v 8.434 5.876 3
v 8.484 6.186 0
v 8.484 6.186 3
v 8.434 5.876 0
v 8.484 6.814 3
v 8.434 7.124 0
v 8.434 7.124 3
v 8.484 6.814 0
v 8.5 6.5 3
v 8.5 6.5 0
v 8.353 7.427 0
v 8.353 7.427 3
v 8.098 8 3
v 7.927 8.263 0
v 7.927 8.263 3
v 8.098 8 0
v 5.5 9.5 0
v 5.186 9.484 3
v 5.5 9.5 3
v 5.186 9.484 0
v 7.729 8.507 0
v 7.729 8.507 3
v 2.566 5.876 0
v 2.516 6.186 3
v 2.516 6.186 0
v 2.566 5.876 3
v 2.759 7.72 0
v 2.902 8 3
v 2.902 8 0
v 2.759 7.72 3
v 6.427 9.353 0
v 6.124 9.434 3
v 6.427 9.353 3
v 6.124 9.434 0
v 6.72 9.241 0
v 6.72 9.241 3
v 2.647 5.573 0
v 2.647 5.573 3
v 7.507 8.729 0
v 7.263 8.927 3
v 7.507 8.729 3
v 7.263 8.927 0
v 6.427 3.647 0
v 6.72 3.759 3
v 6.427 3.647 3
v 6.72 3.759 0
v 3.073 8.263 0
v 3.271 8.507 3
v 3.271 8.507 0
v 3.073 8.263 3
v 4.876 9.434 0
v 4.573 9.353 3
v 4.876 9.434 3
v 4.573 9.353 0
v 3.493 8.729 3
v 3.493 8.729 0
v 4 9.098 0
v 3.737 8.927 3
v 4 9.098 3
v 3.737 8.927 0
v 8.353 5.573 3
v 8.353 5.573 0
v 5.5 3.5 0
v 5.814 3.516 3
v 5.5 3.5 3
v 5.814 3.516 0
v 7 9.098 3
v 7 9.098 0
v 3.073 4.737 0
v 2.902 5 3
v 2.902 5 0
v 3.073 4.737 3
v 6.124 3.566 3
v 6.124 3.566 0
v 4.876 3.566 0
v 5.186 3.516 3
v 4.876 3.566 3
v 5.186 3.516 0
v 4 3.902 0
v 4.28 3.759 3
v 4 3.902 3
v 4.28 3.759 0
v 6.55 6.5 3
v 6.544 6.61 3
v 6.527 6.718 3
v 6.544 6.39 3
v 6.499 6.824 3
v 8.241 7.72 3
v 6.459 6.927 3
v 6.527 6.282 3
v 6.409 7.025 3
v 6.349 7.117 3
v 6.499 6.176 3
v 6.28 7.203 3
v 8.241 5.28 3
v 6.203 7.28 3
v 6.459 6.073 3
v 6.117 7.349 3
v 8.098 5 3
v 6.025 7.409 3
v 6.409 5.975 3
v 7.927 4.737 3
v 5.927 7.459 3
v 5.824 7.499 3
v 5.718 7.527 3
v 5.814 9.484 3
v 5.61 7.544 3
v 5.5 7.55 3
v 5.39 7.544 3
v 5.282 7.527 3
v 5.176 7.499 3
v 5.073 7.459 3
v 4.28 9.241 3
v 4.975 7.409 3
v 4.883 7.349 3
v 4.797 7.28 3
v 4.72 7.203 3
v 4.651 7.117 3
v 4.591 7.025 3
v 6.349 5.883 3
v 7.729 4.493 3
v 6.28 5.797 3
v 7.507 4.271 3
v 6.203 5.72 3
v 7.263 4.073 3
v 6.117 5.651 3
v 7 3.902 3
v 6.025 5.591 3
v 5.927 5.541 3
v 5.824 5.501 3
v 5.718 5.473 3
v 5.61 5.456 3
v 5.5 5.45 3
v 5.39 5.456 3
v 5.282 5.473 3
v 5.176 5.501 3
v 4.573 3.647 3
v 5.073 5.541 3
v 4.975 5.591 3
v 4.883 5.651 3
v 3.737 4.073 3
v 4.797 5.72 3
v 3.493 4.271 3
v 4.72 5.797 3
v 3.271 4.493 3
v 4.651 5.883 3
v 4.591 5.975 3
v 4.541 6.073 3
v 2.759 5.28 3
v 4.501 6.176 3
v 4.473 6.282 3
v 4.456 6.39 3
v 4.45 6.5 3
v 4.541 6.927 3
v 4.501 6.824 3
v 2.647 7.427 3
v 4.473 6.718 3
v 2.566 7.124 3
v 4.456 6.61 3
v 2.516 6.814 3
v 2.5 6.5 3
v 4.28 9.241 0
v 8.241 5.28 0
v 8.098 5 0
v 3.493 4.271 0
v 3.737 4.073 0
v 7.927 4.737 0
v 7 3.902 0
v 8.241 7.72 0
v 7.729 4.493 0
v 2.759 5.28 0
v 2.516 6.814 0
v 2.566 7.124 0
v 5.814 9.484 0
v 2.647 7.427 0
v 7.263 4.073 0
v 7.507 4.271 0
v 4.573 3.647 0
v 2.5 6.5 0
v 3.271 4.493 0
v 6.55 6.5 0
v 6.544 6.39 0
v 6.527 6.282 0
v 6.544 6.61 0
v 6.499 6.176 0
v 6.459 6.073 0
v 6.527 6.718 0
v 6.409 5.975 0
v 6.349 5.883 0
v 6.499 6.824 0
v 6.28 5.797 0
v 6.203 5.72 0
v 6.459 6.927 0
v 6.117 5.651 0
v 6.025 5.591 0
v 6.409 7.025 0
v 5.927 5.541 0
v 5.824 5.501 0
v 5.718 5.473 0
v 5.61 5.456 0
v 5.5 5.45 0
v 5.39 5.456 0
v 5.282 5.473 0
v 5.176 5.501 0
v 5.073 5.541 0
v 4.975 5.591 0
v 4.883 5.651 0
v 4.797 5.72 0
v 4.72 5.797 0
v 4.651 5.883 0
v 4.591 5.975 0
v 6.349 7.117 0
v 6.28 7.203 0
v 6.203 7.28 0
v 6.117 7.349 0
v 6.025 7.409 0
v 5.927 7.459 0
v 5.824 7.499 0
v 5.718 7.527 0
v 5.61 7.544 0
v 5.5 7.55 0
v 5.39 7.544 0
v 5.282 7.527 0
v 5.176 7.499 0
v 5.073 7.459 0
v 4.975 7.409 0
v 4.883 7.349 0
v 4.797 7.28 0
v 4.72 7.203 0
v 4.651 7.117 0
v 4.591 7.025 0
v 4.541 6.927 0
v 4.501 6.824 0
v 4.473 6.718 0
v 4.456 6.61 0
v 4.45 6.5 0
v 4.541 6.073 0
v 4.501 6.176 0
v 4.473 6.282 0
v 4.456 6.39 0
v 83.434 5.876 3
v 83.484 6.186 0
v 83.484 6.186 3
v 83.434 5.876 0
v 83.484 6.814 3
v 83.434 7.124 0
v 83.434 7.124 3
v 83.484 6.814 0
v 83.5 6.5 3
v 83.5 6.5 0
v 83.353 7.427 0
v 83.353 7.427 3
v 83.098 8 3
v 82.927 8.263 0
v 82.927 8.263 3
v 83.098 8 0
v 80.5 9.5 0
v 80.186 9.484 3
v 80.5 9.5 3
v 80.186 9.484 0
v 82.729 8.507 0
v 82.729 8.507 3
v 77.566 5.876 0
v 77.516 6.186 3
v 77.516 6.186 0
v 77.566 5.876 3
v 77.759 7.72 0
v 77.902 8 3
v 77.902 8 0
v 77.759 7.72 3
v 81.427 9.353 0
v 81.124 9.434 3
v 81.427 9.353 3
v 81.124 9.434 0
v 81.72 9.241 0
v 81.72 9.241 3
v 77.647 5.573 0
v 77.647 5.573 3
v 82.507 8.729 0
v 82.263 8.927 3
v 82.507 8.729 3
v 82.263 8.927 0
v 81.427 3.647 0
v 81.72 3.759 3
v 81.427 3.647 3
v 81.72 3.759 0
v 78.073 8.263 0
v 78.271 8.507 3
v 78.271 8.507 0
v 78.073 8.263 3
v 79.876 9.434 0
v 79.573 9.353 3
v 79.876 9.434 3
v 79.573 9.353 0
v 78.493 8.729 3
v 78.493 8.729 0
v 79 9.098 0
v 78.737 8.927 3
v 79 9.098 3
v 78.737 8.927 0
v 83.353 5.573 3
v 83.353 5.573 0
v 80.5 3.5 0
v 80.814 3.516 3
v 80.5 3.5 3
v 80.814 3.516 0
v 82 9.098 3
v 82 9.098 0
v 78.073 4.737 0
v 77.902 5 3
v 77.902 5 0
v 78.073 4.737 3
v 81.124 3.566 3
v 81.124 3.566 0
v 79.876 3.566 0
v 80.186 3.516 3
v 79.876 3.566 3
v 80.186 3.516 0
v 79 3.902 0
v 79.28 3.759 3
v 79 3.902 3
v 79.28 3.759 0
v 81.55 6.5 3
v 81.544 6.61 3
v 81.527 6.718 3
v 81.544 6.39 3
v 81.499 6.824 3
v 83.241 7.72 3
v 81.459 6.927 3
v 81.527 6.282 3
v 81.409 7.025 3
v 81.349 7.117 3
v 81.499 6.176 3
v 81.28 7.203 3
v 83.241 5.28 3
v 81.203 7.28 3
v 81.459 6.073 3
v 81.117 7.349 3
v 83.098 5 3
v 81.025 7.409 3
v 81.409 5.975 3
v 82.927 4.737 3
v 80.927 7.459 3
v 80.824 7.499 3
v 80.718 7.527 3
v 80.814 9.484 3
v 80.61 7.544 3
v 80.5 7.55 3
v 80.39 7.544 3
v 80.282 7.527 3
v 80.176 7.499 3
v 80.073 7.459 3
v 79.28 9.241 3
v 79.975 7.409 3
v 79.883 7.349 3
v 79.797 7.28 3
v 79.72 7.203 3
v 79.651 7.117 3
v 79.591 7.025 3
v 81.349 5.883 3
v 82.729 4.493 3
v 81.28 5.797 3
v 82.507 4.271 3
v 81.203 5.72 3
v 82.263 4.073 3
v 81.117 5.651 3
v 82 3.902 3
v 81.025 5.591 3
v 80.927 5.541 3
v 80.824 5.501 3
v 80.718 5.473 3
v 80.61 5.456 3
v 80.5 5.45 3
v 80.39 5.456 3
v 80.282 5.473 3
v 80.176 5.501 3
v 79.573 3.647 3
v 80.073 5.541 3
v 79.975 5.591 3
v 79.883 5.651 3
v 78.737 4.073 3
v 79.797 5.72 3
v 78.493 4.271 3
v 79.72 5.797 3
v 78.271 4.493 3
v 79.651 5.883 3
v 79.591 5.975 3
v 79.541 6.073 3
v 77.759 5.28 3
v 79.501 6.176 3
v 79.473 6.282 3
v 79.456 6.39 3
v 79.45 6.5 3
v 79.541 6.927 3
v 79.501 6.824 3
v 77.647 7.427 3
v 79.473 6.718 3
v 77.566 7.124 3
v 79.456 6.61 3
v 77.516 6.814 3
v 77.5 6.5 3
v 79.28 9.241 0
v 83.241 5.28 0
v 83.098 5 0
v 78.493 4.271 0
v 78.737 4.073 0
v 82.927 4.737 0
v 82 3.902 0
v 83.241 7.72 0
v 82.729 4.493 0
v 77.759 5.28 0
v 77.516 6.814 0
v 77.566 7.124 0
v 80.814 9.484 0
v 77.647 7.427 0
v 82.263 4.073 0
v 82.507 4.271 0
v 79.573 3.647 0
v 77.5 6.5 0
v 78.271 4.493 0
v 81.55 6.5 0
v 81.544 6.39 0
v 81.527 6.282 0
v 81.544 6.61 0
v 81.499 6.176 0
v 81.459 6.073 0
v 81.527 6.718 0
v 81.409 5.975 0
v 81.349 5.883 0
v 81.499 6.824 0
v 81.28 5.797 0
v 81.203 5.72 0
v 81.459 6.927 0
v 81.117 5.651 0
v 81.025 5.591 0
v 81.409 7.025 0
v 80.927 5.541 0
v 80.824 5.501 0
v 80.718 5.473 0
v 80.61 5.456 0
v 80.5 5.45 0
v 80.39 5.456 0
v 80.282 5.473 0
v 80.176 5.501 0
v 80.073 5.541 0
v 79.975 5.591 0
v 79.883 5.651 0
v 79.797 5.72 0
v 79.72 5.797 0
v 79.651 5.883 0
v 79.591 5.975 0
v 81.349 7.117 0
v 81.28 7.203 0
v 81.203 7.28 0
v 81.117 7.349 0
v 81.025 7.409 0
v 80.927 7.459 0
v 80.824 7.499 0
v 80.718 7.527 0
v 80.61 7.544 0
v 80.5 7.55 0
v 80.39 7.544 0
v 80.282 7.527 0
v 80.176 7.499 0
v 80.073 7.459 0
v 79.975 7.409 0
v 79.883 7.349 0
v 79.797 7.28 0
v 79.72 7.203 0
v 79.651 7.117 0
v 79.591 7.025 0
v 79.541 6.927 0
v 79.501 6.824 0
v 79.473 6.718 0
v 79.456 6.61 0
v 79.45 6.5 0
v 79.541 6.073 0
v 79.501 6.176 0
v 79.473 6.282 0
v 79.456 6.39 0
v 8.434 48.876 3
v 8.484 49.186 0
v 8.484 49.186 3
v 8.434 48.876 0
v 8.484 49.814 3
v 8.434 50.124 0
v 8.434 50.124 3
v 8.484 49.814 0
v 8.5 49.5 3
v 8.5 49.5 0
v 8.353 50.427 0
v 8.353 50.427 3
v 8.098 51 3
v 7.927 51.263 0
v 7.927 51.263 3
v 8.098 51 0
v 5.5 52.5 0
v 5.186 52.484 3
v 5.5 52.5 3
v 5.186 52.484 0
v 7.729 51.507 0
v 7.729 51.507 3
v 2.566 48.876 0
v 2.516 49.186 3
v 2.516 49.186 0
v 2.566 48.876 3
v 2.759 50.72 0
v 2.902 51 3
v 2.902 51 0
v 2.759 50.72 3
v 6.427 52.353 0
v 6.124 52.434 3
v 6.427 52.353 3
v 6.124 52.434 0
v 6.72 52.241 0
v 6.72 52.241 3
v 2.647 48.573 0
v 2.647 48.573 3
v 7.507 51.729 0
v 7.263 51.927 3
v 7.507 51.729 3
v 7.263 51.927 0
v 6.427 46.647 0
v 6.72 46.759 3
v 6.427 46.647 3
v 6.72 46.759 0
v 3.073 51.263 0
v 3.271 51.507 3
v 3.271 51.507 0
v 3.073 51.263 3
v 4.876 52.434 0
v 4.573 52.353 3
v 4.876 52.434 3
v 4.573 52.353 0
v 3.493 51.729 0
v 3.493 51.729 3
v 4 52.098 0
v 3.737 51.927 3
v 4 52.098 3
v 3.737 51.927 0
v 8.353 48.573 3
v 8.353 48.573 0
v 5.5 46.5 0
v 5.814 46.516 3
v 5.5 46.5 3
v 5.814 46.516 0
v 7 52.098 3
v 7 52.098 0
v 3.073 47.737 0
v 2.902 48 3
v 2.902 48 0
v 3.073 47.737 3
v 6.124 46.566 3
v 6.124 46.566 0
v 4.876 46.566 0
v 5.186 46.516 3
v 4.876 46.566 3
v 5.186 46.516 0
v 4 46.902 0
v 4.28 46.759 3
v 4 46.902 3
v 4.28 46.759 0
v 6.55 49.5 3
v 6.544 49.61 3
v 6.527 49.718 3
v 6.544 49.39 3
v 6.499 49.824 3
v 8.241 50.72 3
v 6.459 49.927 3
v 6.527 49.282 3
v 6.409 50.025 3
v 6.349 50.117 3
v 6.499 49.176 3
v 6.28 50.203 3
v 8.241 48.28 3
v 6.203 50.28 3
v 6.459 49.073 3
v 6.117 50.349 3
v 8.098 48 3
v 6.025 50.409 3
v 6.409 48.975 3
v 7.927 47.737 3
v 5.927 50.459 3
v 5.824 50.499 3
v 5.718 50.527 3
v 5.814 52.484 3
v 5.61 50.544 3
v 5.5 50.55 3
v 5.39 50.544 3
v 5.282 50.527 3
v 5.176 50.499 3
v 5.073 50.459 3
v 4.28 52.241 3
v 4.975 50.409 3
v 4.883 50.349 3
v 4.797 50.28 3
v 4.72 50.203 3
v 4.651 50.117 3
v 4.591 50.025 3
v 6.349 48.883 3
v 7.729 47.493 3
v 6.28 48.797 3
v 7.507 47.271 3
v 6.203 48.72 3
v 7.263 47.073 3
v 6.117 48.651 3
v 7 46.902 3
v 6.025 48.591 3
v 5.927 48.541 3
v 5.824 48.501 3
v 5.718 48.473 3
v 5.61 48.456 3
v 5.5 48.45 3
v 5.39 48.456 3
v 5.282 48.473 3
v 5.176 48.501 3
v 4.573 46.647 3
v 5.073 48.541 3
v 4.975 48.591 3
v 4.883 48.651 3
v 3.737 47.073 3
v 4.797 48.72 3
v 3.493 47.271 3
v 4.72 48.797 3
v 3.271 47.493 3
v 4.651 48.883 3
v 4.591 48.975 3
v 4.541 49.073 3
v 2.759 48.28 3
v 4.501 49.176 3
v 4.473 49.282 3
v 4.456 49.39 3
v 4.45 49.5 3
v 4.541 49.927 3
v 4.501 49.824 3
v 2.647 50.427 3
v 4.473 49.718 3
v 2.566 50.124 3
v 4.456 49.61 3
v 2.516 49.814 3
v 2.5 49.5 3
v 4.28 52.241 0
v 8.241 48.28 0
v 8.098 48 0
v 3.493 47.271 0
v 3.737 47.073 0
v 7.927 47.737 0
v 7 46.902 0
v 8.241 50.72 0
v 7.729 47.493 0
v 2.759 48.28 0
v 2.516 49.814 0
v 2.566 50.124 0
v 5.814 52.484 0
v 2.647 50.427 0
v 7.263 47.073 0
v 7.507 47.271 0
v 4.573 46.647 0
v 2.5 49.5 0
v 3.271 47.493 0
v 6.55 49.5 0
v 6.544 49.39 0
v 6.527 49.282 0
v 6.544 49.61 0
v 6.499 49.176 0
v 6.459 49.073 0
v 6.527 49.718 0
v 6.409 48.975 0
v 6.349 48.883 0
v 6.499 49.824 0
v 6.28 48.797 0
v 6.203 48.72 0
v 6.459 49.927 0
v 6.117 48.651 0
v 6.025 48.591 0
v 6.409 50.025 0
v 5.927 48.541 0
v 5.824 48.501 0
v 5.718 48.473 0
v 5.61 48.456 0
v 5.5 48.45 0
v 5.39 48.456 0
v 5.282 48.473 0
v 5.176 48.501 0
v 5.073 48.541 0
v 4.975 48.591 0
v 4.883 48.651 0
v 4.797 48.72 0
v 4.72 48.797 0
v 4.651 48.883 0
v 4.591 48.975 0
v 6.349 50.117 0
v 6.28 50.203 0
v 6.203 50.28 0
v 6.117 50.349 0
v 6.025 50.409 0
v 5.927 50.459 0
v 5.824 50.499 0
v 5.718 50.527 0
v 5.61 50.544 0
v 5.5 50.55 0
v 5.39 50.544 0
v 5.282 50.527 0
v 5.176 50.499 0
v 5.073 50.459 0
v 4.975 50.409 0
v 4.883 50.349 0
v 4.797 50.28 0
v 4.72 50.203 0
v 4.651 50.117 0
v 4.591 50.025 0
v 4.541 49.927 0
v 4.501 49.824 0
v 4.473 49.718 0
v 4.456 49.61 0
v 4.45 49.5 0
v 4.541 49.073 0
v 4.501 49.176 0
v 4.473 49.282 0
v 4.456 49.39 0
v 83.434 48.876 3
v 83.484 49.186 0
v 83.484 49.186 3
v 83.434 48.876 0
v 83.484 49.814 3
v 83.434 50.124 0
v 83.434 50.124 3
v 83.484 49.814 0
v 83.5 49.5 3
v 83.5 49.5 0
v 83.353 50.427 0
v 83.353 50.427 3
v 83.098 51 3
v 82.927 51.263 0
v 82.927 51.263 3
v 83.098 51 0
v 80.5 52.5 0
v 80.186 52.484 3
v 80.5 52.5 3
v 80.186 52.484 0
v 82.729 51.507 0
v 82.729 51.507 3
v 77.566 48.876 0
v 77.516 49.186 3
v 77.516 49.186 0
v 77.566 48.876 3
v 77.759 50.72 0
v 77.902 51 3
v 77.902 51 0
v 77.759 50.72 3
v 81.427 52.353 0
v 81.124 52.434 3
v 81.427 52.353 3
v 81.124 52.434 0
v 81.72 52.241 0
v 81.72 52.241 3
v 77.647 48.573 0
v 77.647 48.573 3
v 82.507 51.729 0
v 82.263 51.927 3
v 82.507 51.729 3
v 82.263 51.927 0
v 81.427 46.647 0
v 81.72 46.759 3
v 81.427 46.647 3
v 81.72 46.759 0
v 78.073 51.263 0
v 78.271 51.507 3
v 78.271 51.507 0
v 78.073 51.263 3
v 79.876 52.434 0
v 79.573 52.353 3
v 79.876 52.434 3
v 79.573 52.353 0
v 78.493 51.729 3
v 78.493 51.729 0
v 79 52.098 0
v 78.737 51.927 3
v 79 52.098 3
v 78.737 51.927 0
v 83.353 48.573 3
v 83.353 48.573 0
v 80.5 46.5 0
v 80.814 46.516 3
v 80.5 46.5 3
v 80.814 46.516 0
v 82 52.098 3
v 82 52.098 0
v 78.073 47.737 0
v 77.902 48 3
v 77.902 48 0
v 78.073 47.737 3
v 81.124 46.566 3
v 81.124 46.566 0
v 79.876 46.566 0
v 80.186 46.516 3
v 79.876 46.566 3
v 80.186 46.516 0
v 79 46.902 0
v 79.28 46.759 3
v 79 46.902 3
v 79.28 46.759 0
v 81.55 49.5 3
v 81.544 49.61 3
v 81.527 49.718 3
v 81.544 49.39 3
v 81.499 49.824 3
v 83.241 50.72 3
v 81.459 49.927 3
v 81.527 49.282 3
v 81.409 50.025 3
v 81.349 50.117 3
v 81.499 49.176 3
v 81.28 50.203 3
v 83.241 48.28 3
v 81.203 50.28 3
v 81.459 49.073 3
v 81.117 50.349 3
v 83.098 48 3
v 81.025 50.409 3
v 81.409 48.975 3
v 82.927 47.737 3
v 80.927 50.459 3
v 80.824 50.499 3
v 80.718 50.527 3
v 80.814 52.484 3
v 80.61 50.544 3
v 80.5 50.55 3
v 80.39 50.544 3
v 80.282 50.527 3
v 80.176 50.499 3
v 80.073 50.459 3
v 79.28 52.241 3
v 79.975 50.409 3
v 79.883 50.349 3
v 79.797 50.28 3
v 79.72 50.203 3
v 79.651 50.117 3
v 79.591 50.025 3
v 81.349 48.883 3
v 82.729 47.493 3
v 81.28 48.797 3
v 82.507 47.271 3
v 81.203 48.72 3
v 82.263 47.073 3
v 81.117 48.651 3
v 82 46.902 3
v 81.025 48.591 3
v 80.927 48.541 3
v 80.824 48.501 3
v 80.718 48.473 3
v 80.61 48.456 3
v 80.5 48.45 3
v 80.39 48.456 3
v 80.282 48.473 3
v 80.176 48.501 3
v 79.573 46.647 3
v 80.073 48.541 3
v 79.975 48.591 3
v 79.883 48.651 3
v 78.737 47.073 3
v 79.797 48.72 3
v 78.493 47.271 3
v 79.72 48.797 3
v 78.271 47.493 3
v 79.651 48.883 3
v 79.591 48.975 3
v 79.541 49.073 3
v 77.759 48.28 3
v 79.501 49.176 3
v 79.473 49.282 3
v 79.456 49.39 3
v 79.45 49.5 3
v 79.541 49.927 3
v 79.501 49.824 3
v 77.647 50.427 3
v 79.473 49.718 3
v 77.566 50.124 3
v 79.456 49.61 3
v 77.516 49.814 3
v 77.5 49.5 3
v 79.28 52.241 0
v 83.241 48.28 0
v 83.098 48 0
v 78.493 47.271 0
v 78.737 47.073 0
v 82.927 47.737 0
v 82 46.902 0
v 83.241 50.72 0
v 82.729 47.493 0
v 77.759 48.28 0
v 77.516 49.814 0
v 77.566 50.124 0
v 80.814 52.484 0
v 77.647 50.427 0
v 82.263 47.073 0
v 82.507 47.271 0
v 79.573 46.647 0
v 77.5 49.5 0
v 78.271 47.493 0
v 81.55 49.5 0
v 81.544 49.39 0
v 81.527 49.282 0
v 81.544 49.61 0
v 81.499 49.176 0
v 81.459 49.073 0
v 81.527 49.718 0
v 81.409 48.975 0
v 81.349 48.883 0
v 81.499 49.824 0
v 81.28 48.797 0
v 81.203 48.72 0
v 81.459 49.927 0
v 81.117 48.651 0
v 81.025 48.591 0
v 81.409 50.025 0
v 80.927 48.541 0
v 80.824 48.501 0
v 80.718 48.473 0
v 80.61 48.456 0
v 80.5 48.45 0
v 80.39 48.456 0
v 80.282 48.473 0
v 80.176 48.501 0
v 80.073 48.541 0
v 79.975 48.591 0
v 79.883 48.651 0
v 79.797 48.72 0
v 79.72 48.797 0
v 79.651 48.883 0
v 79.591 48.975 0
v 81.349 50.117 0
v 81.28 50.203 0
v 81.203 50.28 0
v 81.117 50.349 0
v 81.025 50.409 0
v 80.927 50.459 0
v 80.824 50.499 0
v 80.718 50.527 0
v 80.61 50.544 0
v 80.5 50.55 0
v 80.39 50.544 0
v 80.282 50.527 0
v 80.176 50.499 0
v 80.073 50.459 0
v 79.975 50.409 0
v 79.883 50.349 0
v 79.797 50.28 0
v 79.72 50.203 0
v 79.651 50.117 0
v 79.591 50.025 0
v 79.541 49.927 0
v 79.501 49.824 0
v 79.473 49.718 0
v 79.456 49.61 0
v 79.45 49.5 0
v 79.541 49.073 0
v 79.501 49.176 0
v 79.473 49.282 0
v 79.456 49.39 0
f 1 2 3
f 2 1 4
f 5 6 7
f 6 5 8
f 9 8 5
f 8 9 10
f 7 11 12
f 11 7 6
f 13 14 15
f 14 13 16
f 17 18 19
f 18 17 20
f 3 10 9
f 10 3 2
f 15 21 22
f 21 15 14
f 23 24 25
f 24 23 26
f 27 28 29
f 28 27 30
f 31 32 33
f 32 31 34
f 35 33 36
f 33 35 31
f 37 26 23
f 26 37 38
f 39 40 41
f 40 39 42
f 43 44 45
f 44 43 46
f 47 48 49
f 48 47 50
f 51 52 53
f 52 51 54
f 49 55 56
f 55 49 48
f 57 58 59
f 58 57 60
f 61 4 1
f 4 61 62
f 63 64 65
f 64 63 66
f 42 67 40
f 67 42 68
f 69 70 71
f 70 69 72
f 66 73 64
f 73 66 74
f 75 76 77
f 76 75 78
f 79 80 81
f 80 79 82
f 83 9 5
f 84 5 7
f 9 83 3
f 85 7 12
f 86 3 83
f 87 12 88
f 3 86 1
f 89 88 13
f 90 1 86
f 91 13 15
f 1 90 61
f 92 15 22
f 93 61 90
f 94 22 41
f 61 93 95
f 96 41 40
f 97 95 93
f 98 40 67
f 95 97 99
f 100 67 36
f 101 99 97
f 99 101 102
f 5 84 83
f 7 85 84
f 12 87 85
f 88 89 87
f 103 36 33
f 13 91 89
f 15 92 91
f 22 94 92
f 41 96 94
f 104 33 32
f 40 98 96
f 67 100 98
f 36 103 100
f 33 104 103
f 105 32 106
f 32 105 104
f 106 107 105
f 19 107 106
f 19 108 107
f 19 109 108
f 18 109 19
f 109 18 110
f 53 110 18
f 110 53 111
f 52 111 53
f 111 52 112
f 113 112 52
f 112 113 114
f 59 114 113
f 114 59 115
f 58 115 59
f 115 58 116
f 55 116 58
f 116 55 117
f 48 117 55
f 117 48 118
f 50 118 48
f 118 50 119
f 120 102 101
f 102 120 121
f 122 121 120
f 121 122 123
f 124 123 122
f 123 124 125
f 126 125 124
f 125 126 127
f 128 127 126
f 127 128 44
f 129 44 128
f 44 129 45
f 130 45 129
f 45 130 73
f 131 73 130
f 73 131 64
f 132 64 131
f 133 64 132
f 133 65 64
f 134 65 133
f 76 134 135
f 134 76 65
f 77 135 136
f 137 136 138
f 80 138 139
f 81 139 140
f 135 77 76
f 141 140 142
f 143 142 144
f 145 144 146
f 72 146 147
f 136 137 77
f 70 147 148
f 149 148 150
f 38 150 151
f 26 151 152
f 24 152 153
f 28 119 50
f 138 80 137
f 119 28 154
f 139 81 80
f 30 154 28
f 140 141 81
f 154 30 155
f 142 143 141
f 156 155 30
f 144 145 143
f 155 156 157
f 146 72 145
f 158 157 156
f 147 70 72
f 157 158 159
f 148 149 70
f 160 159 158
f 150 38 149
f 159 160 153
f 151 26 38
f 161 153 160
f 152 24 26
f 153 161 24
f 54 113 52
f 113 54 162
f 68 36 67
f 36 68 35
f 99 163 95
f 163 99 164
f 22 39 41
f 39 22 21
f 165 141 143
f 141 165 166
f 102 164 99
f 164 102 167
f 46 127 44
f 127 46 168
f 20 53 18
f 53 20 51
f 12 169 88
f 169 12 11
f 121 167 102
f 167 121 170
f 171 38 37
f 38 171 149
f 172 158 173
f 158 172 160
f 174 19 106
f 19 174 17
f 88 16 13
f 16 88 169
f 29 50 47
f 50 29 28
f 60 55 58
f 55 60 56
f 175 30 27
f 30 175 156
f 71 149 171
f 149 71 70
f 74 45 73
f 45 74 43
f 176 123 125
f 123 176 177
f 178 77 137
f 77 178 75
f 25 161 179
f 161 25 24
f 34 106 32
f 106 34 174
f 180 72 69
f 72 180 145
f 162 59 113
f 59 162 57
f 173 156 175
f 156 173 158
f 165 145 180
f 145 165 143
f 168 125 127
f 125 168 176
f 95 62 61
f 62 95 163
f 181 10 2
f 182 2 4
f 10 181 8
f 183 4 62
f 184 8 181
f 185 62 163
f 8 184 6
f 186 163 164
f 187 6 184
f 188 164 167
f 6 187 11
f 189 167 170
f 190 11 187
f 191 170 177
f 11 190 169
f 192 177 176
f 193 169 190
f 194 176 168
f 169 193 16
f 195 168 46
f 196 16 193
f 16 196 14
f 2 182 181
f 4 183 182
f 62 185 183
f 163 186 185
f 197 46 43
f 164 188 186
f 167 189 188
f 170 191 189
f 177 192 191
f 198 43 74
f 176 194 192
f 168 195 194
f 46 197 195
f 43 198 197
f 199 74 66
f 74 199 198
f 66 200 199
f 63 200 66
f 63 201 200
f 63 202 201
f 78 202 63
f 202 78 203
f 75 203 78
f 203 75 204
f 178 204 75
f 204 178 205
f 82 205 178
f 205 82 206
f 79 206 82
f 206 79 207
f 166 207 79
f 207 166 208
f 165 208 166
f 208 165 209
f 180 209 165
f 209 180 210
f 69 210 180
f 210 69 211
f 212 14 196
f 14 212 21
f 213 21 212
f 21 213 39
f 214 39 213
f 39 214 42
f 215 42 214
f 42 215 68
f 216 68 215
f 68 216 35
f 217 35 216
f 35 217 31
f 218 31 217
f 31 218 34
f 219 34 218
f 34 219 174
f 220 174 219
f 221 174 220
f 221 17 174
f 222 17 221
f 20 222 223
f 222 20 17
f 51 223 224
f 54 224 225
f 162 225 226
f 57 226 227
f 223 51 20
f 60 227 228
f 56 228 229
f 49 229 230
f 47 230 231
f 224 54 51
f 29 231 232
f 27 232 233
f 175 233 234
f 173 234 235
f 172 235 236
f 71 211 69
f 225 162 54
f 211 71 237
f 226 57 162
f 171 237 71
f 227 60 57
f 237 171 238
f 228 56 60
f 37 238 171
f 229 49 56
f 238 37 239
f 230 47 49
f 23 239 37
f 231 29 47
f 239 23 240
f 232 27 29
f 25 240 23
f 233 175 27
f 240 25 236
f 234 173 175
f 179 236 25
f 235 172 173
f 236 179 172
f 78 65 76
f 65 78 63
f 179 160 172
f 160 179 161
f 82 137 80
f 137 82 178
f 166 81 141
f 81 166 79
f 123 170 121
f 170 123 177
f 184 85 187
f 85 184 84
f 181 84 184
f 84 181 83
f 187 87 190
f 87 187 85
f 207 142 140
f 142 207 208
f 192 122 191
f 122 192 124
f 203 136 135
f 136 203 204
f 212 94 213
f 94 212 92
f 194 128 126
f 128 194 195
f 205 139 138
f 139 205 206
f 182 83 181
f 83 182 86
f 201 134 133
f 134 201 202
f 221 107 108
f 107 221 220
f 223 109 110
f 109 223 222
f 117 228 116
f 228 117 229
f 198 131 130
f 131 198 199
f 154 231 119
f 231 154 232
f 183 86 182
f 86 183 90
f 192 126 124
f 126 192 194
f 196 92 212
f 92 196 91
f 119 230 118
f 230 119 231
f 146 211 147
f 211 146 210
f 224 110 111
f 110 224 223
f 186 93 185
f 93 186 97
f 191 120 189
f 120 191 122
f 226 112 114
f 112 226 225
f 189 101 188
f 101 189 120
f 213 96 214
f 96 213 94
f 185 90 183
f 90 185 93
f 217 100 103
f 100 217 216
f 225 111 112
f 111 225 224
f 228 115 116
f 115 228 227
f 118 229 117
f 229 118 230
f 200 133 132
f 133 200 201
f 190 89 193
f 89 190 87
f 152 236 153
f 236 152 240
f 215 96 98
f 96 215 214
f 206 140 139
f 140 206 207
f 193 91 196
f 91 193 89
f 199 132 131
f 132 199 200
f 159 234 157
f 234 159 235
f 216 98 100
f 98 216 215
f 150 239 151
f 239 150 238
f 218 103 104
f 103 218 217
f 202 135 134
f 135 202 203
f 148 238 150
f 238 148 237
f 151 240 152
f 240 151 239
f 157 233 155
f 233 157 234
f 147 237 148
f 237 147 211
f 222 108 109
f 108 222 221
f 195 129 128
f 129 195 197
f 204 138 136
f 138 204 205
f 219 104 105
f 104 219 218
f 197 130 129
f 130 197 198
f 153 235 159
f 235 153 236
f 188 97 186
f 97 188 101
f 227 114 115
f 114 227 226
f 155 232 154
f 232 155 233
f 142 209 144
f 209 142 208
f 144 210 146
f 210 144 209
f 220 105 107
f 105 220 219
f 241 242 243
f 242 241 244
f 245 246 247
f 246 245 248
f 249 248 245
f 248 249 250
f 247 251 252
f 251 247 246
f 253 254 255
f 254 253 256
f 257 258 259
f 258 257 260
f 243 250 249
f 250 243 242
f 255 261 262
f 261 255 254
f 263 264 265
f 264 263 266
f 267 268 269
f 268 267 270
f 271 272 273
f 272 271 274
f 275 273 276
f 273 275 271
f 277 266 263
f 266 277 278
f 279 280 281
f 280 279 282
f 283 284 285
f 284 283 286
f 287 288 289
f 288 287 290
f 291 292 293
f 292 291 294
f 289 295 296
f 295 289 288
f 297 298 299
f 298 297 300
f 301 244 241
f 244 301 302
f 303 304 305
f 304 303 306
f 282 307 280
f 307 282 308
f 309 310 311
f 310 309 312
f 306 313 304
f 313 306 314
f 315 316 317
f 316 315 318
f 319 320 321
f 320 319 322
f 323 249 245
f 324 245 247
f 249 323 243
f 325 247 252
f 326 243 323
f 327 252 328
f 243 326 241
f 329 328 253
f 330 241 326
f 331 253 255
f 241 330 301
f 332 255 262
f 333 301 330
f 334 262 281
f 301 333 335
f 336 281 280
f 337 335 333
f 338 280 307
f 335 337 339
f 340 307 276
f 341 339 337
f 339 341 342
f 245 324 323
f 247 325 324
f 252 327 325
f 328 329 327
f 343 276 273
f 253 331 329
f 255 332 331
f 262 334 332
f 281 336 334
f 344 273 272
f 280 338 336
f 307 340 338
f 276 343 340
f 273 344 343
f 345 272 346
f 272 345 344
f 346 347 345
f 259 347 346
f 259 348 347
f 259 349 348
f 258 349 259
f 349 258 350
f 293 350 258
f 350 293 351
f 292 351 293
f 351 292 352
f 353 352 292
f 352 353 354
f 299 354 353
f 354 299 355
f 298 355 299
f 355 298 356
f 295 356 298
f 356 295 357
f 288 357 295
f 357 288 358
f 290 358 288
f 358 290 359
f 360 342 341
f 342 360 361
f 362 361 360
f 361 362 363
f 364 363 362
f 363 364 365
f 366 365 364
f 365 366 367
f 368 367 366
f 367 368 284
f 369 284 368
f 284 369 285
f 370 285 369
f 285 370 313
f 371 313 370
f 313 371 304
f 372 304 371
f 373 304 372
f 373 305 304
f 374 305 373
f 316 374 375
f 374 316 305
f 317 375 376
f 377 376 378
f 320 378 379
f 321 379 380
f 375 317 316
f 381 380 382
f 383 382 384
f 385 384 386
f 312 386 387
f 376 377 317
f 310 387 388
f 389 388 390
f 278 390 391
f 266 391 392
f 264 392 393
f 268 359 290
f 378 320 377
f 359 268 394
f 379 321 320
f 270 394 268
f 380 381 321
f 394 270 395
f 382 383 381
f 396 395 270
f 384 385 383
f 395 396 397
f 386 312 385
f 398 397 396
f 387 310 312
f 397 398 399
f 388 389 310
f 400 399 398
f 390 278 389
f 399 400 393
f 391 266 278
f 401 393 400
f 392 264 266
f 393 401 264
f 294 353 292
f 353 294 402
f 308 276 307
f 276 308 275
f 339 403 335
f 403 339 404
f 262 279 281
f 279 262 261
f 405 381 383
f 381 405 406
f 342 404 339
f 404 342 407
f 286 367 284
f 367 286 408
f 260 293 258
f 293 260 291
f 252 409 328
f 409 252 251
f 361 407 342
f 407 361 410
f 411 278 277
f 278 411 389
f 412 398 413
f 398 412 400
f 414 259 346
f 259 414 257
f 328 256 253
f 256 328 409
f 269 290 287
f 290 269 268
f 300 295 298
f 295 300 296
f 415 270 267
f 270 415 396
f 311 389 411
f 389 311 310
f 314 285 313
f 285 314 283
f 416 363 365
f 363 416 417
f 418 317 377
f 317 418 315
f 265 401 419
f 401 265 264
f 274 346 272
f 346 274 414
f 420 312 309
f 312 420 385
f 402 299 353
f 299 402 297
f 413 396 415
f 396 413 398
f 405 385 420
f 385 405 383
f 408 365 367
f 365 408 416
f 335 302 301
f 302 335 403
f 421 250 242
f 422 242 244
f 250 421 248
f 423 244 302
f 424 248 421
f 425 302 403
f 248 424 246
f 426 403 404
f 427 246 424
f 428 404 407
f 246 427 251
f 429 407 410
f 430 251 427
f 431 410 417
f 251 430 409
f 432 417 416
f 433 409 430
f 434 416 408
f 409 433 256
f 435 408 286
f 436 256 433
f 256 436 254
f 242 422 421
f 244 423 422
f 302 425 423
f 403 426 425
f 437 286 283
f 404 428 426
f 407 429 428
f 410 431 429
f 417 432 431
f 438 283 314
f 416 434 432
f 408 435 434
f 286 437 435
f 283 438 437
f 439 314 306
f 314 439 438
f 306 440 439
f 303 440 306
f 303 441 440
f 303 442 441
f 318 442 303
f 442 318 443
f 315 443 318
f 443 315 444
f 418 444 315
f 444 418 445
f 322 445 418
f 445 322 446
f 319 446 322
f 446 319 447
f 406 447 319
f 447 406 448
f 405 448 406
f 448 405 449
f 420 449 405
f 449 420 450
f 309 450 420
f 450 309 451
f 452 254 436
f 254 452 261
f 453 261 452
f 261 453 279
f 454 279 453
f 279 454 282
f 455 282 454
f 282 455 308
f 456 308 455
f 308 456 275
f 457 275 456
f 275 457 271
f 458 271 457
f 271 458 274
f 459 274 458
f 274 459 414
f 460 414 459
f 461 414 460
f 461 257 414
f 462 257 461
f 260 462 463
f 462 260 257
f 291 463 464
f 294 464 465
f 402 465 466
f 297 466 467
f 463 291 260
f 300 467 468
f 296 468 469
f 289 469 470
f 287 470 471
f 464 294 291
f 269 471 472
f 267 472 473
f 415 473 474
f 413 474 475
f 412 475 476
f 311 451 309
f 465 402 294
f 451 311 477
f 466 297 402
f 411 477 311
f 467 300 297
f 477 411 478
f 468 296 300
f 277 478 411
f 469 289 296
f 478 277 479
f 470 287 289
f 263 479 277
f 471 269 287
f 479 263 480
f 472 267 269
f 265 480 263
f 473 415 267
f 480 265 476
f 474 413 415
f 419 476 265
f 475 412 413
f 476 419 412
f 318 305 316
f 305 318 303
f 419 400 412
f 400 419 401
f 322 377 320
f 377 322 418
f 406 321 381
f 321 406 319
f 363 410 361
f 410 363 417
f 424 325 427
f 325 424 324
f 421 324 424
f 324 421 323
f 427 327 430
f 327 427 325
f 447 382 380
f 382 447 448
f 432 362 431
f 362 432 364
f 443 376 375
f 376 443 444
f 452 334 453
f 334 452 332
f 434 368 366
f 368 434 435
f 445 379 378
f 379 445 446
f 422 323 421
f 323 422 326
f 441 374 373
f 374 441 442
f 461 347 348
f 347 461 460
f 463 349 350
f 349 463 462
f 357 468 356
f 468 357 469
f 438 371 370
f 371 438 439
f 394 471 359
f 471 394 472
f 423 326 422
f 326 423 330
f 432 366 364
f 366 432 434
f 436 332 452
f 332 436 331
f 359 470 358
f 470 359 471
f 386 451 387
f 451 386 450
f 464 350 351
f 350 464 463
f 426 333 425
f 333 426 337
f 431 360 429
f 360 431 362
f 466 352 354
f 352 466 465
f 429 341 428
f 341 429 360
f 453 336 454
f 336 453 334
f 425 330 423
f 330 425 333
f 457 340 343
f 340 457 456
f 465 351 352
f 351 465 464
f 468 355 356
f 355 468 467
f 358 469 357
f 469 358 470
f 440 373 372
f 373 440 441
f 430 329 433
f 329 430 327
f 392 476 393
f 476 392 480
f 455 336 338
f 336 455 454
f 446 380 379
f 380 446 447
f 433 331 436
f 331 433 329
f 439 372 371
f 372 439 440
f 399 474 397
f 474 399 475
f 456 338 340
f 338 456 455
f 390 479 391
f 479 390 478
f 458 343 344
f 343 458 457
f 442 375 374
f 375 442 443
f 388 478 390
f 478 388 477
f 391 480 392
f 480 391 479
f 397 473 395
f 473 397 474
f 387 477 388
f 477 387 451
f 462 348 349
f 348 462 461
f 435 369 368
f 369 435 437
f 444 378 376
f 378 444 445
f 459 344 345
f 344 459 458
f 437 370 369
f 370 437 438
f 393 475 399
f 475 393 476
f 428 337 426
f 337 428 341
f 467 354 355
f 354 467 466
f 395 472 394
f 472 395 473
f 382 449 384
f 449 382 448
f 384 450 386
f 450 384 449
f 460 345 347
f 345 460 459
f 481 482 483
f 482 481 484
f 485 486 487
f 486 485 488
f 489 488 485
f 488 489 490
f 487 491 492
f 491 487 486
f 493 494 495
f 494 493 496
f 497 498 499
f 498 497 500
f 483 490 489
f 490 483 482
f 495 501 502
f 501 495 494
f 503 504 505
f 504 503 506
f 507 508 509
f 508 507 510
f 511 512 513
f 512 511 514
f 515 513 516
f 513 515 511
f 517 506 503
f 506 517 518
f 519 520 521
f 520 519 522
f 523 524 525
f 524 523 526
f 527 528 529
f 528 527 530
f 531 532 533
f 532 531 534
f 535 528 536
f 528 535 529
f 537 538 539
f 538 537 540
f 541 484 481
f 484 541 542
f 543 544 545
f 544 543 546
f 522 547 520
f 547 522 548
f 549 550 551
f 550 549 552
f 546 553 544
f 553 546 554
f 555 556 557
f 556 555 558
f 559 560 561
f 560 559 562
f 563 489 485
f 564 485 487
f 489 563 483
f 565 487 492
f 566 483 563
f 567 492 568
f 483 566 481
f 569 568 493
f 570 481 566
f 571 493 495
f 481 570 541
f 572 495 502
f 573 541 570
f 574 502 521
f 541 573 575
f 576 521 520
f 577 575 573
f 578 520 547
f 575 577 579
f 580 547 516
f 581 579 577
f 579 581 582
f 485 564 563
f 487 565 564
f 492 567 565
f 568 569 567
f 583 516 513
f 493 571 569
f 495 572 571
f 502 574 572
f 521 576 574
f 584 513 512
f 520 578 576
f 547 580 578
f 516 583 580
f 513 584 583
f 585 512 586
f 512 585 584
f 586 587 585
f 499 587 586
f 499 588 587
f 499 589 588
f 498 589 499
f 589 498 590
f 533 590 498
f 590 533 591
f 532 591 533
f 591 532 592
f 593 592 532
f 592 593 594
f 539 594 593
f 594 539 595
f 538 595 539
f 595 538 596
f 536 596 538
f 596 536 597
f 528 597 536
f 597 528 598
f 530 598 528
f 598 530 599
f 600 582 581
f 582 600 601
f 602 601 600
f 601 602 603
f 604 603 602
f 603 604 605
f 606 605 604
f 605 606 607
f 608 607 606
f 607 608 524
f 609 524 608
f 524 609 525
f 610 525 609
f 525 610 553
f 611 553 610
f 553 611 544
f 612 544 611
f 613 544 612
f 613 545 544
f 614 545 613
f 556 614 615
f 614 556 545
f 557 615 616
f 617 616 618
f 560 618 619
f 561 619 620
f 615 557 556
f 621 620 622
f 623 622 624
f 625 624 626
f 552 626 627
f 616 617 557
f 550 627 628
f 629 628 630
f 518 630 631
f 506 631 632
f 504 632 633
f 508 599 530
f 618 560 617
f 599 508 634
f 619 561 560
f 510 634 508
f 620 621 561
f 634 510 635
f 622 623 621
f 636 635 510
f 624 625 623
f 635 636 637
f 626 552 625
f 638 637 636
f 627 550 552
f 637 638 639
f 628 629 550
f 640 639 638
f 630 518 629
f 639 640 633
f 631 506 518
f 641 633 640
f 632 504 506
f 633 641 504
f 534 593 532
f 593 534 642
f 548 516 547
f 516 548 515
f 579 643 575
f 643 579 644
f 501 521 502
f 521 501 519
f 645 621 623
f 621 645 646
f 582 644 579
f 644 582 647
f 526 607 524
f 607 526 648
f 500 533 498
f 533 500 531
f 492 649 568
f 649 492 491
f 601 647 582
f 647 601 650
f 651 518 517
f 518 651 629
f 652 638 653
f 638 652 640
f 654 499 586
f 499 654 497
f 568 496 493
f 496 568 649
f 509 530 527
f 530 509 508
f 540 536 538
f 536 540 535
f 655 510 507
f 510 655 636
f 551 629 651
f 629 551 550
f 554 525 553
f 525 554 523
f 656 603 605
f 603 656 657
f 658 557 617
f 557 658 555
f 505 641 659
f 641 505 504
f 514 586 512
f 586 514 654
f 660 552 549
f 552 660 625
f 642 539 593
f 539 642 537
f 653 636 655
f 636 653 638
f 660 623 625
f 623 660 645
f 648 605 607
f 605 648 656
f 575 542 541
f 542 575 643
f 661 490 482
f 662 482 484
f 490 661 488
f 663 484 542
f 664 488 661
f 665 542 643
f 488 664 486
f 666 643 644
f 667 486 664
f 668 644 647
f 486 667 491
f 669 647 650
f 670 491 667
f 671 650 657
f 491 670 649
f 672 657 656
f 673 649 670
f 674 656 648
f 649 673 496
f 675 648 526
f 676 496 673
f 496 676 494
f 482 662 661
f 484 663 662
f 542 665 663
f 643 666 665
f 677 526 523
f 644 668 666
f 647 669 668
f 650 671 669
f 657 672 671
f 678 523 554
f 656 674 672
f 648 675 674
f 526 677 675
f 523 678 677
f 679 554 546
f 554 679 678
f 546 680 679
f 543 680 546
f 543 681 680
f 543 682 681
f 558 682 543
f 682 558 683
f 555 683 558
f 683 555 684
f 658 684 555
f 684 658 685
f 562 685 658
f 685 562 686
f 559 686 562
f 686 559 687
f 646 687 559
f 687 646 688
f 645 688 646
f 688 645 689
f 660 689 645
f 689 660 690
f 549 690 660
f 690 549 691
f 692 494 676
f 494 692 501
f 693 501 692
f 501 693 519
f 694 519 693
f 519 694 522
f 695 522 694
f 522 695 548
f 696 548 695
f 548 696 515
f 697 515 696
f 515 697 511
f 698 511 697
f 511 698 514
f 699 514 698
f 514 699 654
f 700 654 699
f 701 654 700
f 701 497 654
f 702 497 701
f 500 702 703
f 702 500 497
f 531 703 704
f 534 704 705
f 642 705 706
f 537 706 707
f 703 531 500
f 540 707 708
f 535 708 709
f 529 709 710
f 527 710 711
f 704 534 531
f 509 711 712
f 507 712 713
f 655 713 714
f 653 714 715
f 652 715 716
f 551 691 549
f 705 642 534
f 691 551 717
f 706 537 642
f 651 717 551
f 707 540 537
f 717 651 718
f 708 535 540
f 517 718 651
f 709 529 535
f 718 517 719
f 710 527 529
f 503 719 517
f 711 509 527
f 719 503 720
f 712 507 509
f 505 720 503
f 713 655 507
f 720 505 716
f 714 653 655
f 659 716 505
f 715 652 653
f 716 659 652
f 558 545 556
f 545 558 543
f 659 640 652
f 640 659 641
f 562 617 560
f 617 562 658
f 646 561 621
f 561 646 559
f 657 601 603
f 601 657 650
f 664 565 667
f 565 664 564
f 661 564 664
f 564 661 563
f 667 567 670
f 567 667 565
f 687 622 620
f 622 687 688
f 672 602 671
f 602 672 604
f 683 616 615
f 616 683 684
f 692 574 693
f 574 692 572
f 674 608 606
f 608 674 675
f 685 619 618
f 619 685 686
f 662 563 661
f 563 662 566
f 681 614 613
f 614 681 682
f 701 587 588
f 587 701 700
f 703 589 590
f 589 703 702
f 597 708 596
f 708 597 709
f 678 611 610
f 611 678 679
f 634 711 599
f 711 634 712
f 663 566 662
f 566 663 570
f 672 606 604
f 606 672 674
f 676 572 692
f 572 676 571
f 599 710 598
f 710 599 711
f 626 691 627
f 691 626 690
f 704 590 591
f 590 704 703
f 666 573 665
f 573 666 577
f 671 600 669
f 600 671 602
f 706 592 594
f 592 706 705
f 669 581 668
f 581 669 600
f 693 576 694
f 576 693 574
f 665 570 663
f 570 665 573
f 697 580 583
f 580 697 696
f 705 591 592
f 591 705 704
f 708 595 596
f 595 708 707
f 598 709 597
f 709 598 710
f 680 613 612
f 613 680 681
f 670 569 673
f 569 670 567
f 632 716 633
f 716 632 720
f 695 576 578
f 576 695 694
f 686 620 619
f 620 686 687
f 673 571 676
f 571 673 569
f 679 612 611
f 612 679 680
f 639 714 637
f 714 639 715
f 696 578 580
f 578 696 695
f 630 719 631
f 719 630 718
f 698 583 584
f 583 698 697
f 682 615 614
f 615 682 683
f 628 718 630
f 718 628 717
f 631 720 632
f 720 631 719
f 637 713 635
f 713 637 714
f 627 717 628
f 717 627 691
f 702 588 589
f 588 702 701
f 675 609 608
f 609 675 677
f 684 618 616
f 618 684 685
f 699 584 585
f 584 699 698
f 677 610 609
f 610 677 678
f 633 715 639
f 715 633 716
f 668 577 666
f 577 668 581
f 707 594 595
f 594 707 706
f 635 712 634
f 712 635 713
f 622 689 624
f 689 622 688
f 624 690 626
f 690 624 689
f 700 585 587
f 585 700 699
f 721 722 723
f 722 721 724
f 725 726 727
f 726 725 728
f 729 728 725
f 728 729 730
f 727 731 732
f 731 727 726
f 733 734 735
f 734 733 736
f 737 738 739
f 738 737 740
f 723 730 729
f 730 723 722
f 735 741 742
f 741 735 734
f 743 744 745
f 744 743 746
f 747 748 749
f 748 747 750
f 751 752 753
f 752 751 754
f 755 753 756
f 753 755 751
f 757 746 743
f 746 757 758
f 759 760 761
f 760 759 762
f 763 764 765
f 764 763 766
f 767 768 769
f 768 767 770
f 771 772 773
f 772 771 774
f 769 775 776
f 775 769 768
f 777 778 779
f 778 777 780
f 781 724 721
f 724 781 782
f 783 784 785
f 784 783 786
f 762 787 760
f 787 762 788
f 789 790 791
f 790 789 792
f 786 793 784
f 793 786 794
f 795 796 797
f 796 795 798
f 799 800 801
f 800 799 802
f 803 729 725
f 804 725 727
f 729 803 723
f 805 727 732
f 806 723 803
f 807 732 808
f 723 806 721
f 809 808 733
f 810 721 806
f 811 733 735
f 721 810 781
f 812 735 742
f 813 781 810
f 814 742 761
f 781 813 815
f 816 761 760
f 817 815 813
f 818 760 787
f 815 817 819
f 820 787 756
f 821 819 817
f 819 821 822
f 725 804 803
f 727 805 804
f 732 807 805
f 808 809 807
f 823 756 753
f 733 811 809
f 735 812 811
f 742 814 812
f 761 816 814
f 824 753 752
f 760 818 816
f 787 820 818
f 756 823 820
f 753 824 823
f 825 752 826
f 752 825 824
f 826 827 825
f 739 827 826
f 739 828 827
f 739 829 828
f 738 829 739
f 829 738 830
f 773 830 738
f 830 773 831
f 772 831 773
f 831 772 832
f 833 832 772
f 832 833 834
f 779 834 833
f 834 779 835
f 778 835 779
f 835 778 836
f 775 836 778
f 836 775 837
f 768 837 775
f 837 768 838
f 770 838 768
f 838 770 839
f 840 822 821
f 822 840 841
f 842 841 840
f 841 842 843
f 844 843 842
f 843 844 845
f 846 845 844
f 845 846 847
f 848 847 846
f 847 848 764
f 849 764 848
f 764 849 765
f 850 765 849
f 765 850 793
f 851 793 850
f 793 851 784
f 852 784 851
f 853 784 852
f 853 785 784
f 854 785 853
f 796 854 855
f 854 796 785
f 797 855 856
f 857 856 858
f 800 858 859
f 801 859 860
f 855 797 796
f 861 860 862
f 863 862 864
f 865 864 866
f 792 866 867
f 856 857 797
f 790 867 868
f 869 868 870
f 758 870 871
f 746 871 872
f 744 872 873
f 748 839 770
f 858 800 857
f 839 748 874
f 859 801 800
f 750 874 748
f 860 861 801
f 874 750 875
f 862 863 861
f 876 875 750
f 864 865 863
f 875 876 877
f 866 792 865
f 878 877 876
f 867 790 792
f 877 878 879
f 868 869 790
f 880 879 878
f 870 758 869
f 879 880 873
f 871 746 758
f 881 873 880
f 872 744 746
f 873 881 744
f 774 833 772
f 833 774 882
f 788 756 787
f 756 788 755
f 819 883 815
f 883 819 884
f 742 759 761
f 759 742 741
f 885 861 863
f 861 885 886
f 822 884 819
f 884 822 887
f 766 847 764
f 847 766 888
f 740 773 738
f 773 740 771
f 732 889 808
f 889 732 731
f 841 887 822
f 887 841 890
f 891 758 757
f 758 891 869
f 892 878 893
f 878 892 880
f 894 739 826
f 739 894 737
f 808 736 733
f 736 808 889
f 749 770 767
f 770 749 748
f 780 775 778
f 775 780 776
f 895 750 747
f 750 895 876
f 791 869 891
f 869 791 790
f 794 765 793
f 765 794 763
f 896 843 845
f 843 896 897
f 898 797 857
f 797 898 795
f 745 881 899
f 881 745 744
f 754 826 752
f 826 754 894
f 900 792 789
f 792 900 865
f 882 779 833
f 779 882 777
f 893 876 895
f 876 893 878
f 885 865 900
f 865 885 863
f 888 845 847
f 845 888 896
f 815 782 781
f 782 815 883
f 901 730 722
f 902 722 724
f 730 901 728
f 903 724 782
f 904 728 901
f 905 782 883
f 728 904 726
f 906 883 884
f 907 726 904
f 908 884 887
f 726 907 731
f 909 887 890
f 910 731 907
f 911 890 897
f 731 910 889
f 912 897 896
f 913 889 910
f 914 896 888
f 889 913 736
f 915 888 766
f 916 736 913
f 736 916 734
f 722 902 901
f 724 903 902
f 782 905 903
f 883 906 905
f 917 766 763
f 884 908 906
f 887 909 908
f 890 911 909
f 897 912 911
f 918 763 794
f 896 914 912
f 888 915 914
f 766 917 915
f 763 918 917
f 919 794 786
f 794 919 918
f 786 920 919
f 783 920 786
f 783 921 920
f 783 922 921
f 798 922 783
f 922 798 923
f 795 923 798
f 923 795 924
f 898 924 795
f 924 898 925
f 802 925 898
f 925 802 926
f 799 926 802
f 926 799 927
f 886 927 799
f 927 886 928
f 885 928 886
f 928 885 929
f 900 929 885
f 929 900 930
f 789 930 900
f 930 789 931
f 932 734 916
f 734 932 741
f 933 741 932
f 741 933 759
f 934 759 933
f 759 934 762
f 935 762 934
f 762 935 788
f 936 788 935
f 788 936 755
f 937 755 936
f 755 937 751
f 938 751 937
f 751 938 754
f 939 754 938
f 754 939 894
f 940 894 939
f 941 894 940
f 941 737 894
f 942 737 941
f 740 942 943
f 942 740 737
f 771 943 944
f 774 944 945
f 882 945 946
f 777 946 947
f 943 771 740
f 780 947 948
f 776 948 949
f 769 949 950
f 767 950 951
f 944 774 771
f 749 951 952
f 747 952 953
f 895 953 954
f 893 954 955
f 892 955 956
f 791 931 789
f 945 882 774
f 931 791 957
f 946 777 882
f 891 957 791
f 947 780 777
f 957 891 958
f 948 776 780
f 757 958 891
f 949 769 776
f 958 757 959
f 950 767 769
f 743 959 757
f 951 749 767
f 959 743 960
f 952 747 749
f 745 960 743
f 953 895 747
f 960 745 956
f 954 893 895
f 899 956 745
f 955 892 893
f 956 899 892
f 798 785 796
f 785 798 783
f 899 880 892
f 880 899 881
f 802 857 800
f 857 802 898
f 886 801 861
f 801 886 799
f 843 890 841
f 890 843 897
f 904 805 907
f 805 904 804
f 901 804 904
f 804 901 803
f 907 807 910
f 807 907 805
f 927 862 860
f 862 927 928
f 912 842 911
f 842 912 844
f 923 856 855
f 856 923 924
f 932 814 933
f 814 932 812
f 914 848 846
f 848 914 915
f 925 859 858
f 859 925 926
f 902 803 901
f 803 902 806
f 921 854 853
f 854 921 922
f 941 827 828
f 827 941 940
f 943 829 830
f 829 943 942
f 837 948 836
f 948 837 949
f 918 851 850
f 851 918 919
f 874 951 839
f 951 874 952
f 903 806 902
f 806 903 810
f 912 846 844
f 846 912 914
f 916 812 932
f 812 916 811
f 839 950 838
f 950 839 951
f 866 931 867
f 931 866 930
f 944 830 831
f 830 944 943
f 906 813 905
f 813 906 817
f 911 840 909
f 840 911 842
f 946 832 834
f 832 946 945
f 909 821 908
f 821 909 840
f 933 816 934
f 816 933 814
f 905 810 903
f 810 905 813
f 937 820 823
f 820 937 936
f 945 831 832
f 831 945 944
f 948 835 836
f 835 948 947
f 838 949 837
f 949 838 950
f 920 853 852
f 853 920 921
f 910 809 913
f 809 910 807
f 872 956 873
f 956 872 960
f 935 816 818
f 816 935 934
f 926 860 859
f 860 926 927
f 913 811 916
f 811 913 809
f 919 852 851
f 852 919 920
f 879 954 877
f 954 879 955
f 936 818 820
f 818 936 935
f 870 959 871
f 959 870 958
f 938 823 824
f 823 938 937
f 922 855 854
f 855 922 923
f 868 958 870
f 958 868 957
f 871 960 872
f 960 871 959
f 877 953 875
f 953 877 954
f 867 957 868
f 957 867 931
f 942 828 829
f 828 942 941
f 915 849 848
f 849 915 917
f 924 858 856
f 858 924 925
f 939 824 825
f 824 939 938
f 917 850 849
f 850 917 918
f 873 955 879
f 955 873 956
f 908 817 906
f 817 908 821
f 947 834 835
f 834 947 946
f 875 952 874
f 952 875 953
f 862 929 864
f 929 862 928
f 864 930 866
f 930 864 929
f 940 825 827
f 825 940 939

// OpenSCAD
// file: ../../00_common/parameters.scad
// =============================================================================
// OpenMotorBridge - Global CAD Parameters & Settings
// =============================================================================
// File: hardware/cad/scad/00_common/parameters.scad
// Description: Global dimensional constants, manufacturing clearances and
//              circle resolution ($fn) for all OpenSCAD modules.
// =============================================================================

// --- 1. Circle & Curve Resolution ---
$fn = 60; // Smooth cylinders and holes for high-quality MJF 3D printing

// --- 2. Central Main Box Dimensions (3-Tier Sandwich) ---
MAIN_BOX_OUTER_L      = 110.0; // Outer length in X (mm)
MAIN_BOX_OUTER_W      = 74.0;  // Outer width in Y (mm)
MAIN_BOX_LOWER_H      = 17.0;  // Lower case height in Z (mm)
MAIN_BOX_MID_H        = 15.0;  // Mid tray height in Z (mm)
MAIN_BOX_LID_H        = 4.0;   // Lid plate thickness in Z (mm)
MAIN_BOX_WALL         = 2.5;   // Nominal wall thickness (mm)
MAIN_BOX_CORNER_POST  = 5.0;   // Corner clamping screw post size (mm)

// --- 3. Satellite Pod Dimensions (Universal Enlarged Envelope) ---
POD_OUTER_L           = 135.0; // Outer length in X (mm)
POD_OUTER_W           = 70.0;  // Outer width in Y (mm)
POD_OUTER_H           = 38.0;  // Outer height in Z (mm)
POD_WALL              = 3.5;   // Nominal wall thickness (mm)
POD_BULKHEAD_X        = 18.0;  // Partition bulkhead position in X (mm)
POD_CHAMBER_L         = 117.0; // Sliding chamber length in X (mm)
POD_CHAMBER_W         = 63.0;  // Sliding chamber width in Y (mm)
POD_CHAMBER_H         = 31.0;  // Sliding chamber height in Z (mm)

// --- 4. Pod Linear Guide Rails (Poka-Yoke Tongue & Groove) ---
POD_GROOVE_W          = 3.0;   // Internal guide groove width in Z (mm)
POD_GROOVE_DEPTH      = 1.5;   // Internal guide groove depth in Y (mm)
POD_GROOVE_LEFT_Z     = 10.0;  // Center height of left groove (mm)
POD_GROOVE_RIGHT_Z    = 18.0;  // Center height of right groove (mm, asym offset)

CARTRIDGE_TONGUE_W    = 2.6;   // Cartridge tongue rail height in Z (mm, 0.2mm clearance)
CARTRIDGE_TONGUE_PROT = 1.4;   // Cartridge tongue protrusion in Y (mm, 0.1mm clearance)
CARTRIDGE_CHAMFER_L   = 4.0;   // 30° lead-in chamfer nose length (mm)

// --- 5. Cartridge Dimensions (Enlarged Universal Sled) ---
CARTRIDGE_BASE_L      = 116.0; // Sled length in X (mm)
CARTRIDGE_BASE_W      = 58.0;  // Sled width in Y (mm)
CARTRIDGE_BASE_H      = 28.0;  // Sled height in Z (mm)
CARTRIDGE_FACE_L      = 4.0;   // Front faceplate thickness in X (mm)
CARTRIDGE_FACE_W      = 64.0;  // Front faceplate width in Y (mm)
CARTRIDGE_FACE_H      = 34.0;  // Front faceplate height in Z (mm)

// --- 5a. RF Interface & Sealing Dimensions ---
SMA_BORE_R            = 3.25;  // Ø 6.5 mm through-hole for standard SMA bulkhead
SMA_ORECESS_R         = 4.75;  // Ø 9.5 mm recess for waterproof silicone O-ring
SMA_ORECESS_DEPTH     = 1.2;   // 1.2 mm deep O-ring compression pocket

// --- 5b. Magnetic Anti-Theft Lock System ---
LATCH_PIVOT_X         = 58.0;  // Center pivot position along sled X (mm)
LATCH_MAGNET_X        = 46.0;  // Ferromagnetic anchor position along sled X (mm)
LATCH_TOOTH_X         = 70.0;  // Locking sawtooth pawl position along sled X (mm)
LATCH_ARM_H           = 6.0;   // Rocker lever height in Z (mm)
LATCH_ARM_THICK       = 2.6;   // Rocker beam thickness in Y (mm)
LATCH_MAGNET_PIN_DIA  = 6.2;   // Bore for Ø 6.0 mm steel dowel pin (mm)
LATCH_SPRING_DIA      = 3.8;   // Bore for Ø 3.5 mm return compression spring (mm)

// --- 6. Standard Captive Hex Nut Pockets (DIN 934 / DIN 985 with +0.2 mm MJF/FDM clearance) ---
NUT_M2_SW             = 4.2;   // M2 across flats (nominal 4.0 mm)
NUT_M2_H              = 1.8;   // M2 thickness (nominal 1.6 mm)
NUT_M2_5_SW           = 5.2;   // M2.5 across flats (nominal 5.0 mm)
NUT_M2_5_H            = 2.2;   // M2.5 thickness (nominal 2.0 mm)
NUT_M3_SW             = 5.7;   // M3 across flats (nominal 5.5 mm)
NUT_M3_H              = 2.6;   // M3 thickness (nominal 2.4 mm)
NUT_M4_SW             = 7.2;   // M4 across flats (nominal 7.0 mm)
NUT_M4_H              = 3.4;   // M4 thickness (nominal 3.2 mm)
NUT_M5_SW             = 8.2;   // M5 across flats (nominal 8.0 mm)
NUT_M5_H              = 4.2;   // M5 thickness (nominal 4.0 mm)

// Direct Plastic Thread-Forming / Self-Tapping Pilot Holes in PA12 (100% Soldering-Iron Free)
M2_PILOT_HOLE_R       = 0.85;  // Core hole for M2 screws in PA12 (Ø 1.7 mm)
M2_5_PILOT_HOLE_R     = 1.05;  // Core hole for M2.5 screws in PA12 (Ø 2.1 mm)
M3_PILOT_HOLE_R       = 1.25;  // Core hole for M3 screws in PA12 (Ø 2.5 mm)

// --- 7. Screw & Clearance Dimensions ---
M2_SCREW_HOLE_R       = 1.1;   // M2 clearance hole (r = 1.1 mm -> Ø 2.2 mm)
M2_5_SCREW_HOLE_R     = 1.4;   // M2.5 clearance hole (r = 1.4 mm -> Ø 2.8 mm)
M3_SCREW_HOLE_R       = 1.65;  // M3 clearance hole (r = 1.65 mm -> Ø 3.3 mm)
M4_SCREW_HOLE_R       = 2.2;   // M4 clearance hole (r = 2.2 mm -> Ø 4.4 mm)
M8_BORE_R             = 4.0;   // M8 cable through-bore (r = 4.0 mm -> Ø 8.0 mm)
M8_STUDS_OUTER_R      = 6.0;   // M8 neck outer radius (Ø 12.0 mm)

// --- 8. Universal Front Node Enclosure Dimensions (Type E: 98 x 68 x 25 mm) ---
FRONT_NODE_PCB_L      = 82.0;  // PCB length in X (mm, PCBA 05)
FRONT_NODE_PCB_W      = 50.0;  // PCB width in Y (mm, PCBA 05)
FRONT_NODE_PCB_H      = 1.6;   // PCB thickness in Z (mm)
FRONT_NODE_PCB_R      = 2.5;   // PCB corner radius (mm)

FRONT_NODE_CHAMBER_L  = 86.0;  // Internal chamber length in X (mm, 2mm margin per side)
FRONT_NODE_CHAMBER_W  = 56.0;  // Internal chamber width in Y (mm, 3mm margin per side)
FRONT_NODE_TUB_H      = 17.5;  // Lower tub depth in Z (mm)
FRONT_NODE_LID_H      = 7.5;   // Upper lid height in Z (mm)
FRONT_NODE_WALL       = 2.5;   // Wall thickness in HP MJF PA12 (mm)
FRONT_NODE_CORNER_R   = 4.0;   // Outer enclosure corner radius (mm)

FRONT_NODE_OUTER_L    = FRONT_NODE_CHAMBER_L + 2 * FRONT_NODE_WALL + 7.0; // 98.0 mm
FRONT_NODE_OUTER_W    = FRONT_NODE_CHAMBER_W + 2 * FRONT_NODE_WALL + 7.0; // 68.0 mm
FRONT_NODE_OUTER_H    = FRONT_NODE_TUB_H + FRONT_NODE_LID_H;              // 25.0 mm

// PCB Standoff Heights & Radii (100% Soldering-Iron Free)
FRONT_NODE_STANDOFF_H = 3.0;   // Height of PCB standoffs from floor (mm)
FRONT_NODE_STANDOFF_R = 3.0;   // Outer radius of M2.5 screw bosses (mm)
FRONT_NODE_CORE_HOLE_R= M2_5_PILOT_HOLE_R; // Core hole for direct M2.5 screw engagement (Ø 2.1 mm)

// AMPS 4-Hole Mounting Pattern (38 x 30 mm with DIN 934 M4 Captive Nut Pockets)
AMPS_SPACING_X        = 38.0;  // AMPS hole distance in X (mm)
AMPS_SPACING_Y        = 30.0;  // AMPS hole distance in Y (mm)
AMPS_NUT_SW           = NUT_M4_SW; // Captive M4 hex nut pocket across flats (7.2 mm)
AMPS_NUT_H            = NUT_M4_H;  // Captive M4 hex nut pocket depth (3.4 mm)

// Acoustic Vent for Knowles SPH0645 MEMS
FRONT_NODE_MIC_HOLE_R = 1.25;  // Sound canal radius (Ø 2.5 mm)
FRONT_NODE_MIC_MEMB_R = 3.0;   // Gore ePTFE membrane pocket radius (Ø 6.0 mm)
FRONT_NODE_MIC_MEMB_D = 0.8;   // Membrane pocket depth (mm)
// main file
// =============================================================================
// OpenMotorBridge - Front Node PCB Standoffs
// =============================================================================
// File: hardware/cad/scad/04_front_node/parts/001_pcb_standoffs.scad
// Description: 4x M2.5 cylindrical screw boss standoffs matching KiCad H1-H4.
// =============================================================================

include <../../00_common/parameters.scad>;

// Relative offset of PCB inside internal chamber (2mm border clearance)
PCB_OFFSET_X = (FRONT_NODE_CHAMBER_L - FRONT_NODE_PCB_L) / 2.0; // 2.0 mm
PCB_OFFSET_Y = (FRONT_NODE_CHAMBER_W - FRONT_NODE_PCB_W) / 2.0; // 2.0 mm

// Standoff coordinates relative to inner chamber origin (0,0)
FRONT_NODE_STANDOFF_COORDS = [
    [PCB_OFFSET_X + 3.5,                      PCB_OFFSET_Y + 3.5],                      // H1 (bottom-left / SW)
    [PCB_OFFSET_X + FRONT_NODE_PCB_L - 3.5,   PCB_OFFSET_Y + 3.5],                      // H2 (bottom-right / SE)
    [PCB_OFFSET_X + 3.5,                      PCB_OFFSET_Y + FRONT_NODE_PCB_W - 3.5],   // H3 (top-left / NW)
    [PCB_OFFSET_X + FRONT_NODE_PCB_L - 3.5,   PCB_OFFSET_Y + FRONT_NODE_PCB_W - 3.5]    // H4 (top-right / NE)
];

module front_node_pcb_standoffs(h = FRONT_NODE_STANDOFF_H) {
    for (pos = FRONT_NODE_STANDOFF_COORDS) {
        translate([pos[0], pos[1], 0]) {
            difference() {
                cylinder(r=FRONT_NODE_STANDOFF_R, h=h, center=false);
                // 100% Soldering-Iron Free: Direct thread forming pilot hole
                translate([0, 0, -0.1])
                    cylinder(r=FRONT_NODE_CORE_HOLE_R, h=h + 0.2, center=false);
            }
        }
    }
}

// Standalone render / STL export
front_node_pcb_standoffs();
